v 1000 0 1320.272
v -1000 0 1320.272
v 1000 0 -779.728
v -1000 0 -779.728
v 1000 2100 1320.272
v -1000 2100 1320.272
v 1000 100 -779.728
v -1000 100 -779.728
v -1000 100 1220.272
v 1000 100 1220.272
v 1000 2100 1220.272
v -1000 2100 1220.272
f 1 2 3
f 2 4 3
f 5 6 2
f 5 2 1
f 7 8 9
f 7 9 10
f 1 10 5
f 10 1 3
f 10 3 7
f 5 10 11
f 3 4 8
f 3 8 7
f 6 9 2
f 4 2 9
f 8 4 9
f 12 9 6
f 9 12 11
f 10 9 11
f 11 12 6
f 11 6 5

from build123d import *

# Parameters (mm, degrees)
SKETCH1_W           = 2000
SKETCH1_H           = 2000
BOSS_EXTRUDE1_DEPTH = 100
SKETCH2_W           = 2000
SKETCH2_H           = 2100
BOSS_EXTRUDE2_DEPTH = 100


with BuildPart() as part:
    # Sketch1 → Boss-Extrude1 (new body)
    with BuildSketch(Plane(origin=(0, 0, 0), x_dir=(1, 0, 0), z_dir=(0, 1, 0))):
        with Locations((0, -220.271966456)):
            Rectangle(SKETCH1_W, SKETCH1_H)
    extrude(amount=BOSS_EXTRUDE1_DEPTH)

    # Sketch2 → Boss-Extrude2 (add)
    with BuildSketch(Plane.XY.offset(1220.271966456)):
        with Locations((0, 1050)):
            Rectangle(SKETCH2_W, SKETCH2_H)
    extrude(amount=BOSS_EXTRUDE2_DEPTH)


solid = part.part
